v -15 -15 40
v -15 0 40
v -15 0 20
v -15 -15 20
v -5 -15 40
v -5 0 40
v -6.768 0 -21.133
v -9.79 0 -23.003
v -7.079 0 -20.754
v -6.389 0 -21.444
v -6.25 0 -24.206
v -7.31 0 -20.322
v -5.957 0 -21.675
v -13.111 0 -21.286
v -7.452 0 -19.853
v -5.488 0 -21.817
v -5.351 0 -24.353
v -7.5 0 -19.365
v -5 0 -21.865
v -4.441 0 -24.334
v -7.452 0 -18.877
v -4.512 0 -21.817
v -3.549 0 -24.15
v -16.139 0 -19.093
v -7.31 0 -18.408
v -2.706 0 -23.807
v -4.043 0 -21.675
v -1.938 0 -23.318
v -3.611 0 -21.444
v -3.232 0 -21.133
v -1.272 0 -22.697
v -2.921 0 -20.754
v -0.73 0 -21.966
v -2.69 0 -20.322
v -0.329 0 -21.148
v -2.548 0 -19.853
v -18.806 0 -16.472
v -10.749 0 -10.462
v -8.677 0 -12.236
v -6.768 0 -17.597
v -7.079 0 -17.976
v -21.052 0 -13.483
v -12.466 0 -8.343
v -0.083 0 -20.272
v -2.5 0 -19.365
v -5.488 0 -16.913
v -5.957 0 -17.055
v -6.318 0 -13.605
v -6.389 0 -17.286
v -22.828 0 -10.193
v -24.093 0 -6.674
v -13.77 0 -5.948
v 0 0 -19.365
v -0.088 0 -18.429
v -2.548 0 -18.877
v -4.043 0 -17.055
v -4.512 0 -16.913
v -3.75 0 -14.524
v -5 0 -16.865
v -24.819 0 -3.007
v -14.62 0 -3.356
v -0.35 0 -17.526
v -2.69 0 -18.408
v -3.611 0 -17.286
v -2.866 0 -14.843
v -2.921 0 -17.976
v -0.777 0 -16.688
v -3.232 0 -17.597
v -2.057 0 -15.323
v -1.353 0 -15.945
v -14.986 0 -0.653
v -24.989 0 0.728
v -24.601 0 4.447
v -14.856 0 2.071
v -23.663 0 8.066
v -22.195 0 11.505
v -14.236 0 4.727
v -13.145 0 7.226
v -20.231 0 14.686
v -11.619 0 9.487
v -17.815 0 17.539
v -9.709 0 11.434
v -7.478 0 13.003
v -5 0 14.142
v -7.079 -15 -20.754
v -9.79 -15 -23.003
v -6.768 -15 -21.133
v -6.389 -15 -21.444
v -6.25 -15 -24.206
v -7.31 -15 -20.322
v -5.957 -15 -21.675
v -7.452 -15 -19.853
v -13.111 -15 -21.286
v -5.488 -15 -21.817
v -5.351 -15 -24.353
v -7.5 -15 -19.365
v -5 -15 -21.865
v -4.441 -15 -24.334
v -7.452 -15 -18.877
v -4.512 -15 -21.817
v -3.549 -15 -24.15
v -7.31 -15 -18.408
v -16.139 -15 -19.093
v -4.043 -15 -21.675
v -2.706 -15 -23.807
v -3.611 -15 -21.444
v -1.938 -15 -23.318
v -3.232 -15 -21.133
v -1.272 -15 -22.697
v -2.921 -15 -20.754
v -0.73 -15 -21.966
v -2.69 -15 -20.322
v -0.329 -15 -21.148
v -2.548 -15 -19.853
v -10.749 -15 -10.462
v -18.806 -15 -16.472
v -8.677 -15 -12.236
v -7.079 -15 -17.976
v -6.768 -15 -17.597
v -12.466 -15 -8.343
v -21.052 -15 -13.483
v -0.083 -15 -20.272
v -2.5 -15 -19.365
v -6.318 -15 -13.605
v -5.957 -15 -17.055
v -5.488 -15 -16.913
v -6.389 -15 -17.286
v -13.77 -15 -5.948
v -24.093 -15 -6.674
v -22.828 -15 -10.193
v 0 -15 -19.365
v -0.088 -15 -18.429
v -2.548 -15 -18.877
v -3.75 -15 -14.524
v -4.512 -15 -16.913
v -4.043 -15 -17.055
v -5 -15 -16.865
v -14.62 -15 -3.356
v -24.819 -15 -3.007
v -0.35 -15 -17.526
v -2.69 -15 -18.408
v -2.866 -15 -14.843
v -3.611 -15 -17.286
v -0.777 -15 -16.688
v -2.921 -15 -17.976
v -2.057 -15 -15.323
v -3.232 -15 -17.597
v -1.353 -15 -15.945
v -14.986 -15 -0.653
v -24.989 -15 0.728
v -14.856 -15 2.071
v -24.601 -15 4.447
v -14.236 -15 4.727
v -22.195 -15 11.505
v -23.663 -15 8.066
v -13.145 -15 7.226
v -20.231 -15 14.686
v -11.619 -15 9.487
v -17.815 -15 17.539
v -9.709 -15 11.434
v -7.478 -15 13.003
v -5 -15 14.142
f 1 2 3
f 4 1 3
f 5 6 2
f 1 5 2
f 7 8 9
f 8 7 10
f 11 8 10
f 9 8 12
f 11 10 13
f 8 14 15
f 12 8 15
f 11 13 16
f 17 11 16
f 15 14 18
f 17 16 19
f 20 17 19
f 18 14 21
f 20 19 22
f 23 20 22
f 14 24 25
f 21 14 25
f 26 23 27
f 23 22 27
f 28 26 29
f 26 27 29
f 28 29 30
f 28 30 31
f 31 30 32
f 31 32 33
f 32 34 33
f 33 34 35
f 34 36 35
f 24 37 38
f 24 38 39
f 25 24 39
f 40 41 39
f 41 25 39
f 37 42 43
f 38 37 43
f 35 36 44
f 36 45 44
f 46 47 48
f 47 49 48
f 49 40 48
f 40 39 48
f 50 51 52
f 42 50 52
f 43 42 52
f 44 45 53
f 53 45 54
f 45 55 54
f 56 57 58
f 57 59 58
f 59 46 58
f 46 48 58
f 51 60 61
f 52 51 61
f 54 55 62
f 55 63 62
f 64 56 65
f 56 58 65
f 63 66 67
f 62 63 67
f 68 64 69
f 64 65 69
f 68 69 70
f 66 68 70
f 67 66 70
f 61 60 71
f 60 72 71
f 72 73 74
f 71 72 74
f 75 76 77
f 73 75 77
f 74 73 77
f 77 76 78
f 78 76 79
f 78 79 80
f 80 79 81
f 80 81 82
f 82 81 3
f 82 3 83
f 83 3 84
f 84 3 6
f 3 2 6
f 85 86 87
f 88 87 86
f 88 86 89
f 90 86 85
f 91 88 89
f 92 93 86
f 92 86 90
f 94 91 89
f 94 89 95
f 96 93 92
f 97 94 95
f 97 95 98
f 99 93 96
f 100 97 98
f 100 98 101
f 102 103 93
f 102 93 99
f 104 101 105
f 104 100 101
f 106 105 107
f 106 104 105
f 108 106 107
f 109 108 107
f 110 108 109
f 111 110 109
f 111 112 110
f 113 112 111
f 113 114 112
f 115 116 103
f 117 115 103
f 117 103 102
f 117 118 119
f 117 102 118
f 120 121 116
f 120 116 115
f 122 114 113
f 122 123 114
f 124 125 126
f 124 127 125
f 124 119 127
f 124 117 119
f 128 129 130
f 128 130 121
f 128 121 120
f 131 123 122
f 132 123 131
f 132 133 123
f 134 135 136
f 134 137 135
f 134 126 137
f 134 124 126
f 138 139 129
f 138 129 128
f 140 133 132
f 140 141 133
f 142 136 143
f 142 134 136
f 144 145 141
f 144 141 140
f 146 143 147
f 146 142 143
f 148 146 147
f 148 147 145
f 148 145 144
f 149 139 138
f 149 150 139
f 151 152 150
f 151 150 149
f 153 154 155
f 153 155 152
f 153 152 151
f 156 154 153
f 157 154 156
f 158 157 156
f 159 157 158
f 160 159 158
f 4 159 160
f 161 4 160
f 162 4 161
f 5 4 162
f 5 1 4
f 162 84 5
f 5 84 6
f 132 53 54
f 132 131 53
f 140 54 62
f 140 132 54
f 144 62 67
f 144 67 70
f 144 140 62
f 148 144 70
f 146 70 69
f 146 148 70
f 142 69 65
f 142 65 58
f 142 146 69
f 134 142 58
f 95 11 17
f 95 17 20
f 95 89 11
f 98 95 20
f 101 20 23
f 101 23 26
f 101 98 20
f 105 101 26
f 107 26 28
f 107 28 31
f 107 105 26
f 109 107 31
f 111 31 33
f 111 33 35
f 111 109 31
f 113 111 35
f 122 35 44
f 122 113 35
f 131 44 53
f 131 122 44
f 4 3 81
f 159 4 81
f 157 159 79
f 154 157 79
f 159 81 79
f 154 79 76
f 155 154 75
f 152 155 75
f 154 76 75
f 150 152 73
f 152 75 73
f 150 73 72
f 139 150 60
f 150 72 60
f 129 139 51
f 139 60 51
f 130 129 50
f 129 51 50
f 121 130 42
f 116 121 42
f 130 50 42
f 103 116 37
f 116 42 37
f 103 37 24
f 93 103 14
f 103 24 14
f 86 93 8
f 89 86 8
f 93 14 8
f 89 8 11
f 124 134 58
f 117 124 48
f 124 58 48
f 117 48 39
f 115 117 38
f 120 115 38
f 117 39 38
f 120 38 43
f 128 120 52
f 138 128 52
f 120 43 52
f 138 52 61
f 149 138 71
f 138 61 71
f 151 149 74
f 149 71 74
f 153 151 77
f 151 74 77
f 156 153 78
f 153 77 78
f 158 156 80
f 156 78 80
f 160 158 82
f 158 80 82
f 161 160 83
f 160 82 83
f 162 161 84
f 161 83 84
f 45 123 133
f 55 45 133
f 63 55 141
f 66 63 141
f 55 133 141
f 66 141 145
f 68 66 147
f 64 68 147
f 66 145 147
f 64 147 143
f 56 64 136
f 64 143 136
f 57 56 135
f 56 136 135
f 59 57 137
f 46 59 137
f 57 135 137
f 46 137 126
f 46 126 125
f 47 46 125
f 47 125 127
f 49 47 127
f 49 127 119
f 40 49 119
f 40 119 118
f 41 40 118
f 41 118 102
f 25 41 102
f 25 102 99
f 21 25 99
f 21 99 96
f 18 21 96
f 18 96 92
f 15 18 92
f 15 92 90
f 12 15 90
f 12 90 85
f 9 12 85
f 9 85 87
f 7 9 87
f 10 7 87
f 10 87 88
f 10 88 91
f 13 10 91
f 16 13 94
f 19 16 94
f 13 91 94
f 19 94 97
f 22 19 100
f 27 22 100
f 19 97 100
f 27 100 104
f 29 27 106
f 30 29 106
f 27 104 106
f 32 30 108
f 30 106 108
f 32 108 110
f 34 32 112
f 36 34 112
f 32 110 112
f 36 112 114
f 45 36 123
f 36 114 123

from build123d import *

# Parameters (mm, degrees)
F1_DEPTH = 15
F2_R     = 4.99999
F3_R     = 2.5
F4_DEPTH = 15.001


# Not quite as in the source:
# - a fillet or chamfer is up to 0.001 mm smaller than in the source, because OpenCascade refuses the exact size


with BuildPart() as f1:
    # F0 (on Front) → F1 (new body)
    with BuildSketch(Plane.XZ):
        with BuildLine():
            Line((-15, 40), (-15, 20))
            ThreePointArc((-15, 20), (-23.7170824513, -7.9056941504), (0, -25))
            Line((0, -25), (0, -15))
            ThreePointArc((0, -15), (-14.7839783948, -2.5365296809), (-5, 14.1421356237))
            Line((-5, 14.1421356237), (-5, 40))
            Line((-5, 40), (-15, 40))
        make_face()
    extrude(amount=F1_DEPTH)

    # F2 (radius 5 in the source; OpenCascade refuses exactly that, so slightly less here)
    f2_edges = [f1.edges().sort_by_distance(p)[0] for p in [
        (0, -7.5, -25),
        (0, -7.5, -15),
    ]]
    fillet(f2_edges, radius=F2_R)

    # F3 (on face) → F4 (cut, through all)
    with BuildSketch(Plane.XZ.offset(15)):
        with Locations((-5, -19.364916731)):
            Circle(F3_R)
    extrude(amount=-F4_DEPTH, mode=Mode.SUBTRACT)


solid = f1.part
